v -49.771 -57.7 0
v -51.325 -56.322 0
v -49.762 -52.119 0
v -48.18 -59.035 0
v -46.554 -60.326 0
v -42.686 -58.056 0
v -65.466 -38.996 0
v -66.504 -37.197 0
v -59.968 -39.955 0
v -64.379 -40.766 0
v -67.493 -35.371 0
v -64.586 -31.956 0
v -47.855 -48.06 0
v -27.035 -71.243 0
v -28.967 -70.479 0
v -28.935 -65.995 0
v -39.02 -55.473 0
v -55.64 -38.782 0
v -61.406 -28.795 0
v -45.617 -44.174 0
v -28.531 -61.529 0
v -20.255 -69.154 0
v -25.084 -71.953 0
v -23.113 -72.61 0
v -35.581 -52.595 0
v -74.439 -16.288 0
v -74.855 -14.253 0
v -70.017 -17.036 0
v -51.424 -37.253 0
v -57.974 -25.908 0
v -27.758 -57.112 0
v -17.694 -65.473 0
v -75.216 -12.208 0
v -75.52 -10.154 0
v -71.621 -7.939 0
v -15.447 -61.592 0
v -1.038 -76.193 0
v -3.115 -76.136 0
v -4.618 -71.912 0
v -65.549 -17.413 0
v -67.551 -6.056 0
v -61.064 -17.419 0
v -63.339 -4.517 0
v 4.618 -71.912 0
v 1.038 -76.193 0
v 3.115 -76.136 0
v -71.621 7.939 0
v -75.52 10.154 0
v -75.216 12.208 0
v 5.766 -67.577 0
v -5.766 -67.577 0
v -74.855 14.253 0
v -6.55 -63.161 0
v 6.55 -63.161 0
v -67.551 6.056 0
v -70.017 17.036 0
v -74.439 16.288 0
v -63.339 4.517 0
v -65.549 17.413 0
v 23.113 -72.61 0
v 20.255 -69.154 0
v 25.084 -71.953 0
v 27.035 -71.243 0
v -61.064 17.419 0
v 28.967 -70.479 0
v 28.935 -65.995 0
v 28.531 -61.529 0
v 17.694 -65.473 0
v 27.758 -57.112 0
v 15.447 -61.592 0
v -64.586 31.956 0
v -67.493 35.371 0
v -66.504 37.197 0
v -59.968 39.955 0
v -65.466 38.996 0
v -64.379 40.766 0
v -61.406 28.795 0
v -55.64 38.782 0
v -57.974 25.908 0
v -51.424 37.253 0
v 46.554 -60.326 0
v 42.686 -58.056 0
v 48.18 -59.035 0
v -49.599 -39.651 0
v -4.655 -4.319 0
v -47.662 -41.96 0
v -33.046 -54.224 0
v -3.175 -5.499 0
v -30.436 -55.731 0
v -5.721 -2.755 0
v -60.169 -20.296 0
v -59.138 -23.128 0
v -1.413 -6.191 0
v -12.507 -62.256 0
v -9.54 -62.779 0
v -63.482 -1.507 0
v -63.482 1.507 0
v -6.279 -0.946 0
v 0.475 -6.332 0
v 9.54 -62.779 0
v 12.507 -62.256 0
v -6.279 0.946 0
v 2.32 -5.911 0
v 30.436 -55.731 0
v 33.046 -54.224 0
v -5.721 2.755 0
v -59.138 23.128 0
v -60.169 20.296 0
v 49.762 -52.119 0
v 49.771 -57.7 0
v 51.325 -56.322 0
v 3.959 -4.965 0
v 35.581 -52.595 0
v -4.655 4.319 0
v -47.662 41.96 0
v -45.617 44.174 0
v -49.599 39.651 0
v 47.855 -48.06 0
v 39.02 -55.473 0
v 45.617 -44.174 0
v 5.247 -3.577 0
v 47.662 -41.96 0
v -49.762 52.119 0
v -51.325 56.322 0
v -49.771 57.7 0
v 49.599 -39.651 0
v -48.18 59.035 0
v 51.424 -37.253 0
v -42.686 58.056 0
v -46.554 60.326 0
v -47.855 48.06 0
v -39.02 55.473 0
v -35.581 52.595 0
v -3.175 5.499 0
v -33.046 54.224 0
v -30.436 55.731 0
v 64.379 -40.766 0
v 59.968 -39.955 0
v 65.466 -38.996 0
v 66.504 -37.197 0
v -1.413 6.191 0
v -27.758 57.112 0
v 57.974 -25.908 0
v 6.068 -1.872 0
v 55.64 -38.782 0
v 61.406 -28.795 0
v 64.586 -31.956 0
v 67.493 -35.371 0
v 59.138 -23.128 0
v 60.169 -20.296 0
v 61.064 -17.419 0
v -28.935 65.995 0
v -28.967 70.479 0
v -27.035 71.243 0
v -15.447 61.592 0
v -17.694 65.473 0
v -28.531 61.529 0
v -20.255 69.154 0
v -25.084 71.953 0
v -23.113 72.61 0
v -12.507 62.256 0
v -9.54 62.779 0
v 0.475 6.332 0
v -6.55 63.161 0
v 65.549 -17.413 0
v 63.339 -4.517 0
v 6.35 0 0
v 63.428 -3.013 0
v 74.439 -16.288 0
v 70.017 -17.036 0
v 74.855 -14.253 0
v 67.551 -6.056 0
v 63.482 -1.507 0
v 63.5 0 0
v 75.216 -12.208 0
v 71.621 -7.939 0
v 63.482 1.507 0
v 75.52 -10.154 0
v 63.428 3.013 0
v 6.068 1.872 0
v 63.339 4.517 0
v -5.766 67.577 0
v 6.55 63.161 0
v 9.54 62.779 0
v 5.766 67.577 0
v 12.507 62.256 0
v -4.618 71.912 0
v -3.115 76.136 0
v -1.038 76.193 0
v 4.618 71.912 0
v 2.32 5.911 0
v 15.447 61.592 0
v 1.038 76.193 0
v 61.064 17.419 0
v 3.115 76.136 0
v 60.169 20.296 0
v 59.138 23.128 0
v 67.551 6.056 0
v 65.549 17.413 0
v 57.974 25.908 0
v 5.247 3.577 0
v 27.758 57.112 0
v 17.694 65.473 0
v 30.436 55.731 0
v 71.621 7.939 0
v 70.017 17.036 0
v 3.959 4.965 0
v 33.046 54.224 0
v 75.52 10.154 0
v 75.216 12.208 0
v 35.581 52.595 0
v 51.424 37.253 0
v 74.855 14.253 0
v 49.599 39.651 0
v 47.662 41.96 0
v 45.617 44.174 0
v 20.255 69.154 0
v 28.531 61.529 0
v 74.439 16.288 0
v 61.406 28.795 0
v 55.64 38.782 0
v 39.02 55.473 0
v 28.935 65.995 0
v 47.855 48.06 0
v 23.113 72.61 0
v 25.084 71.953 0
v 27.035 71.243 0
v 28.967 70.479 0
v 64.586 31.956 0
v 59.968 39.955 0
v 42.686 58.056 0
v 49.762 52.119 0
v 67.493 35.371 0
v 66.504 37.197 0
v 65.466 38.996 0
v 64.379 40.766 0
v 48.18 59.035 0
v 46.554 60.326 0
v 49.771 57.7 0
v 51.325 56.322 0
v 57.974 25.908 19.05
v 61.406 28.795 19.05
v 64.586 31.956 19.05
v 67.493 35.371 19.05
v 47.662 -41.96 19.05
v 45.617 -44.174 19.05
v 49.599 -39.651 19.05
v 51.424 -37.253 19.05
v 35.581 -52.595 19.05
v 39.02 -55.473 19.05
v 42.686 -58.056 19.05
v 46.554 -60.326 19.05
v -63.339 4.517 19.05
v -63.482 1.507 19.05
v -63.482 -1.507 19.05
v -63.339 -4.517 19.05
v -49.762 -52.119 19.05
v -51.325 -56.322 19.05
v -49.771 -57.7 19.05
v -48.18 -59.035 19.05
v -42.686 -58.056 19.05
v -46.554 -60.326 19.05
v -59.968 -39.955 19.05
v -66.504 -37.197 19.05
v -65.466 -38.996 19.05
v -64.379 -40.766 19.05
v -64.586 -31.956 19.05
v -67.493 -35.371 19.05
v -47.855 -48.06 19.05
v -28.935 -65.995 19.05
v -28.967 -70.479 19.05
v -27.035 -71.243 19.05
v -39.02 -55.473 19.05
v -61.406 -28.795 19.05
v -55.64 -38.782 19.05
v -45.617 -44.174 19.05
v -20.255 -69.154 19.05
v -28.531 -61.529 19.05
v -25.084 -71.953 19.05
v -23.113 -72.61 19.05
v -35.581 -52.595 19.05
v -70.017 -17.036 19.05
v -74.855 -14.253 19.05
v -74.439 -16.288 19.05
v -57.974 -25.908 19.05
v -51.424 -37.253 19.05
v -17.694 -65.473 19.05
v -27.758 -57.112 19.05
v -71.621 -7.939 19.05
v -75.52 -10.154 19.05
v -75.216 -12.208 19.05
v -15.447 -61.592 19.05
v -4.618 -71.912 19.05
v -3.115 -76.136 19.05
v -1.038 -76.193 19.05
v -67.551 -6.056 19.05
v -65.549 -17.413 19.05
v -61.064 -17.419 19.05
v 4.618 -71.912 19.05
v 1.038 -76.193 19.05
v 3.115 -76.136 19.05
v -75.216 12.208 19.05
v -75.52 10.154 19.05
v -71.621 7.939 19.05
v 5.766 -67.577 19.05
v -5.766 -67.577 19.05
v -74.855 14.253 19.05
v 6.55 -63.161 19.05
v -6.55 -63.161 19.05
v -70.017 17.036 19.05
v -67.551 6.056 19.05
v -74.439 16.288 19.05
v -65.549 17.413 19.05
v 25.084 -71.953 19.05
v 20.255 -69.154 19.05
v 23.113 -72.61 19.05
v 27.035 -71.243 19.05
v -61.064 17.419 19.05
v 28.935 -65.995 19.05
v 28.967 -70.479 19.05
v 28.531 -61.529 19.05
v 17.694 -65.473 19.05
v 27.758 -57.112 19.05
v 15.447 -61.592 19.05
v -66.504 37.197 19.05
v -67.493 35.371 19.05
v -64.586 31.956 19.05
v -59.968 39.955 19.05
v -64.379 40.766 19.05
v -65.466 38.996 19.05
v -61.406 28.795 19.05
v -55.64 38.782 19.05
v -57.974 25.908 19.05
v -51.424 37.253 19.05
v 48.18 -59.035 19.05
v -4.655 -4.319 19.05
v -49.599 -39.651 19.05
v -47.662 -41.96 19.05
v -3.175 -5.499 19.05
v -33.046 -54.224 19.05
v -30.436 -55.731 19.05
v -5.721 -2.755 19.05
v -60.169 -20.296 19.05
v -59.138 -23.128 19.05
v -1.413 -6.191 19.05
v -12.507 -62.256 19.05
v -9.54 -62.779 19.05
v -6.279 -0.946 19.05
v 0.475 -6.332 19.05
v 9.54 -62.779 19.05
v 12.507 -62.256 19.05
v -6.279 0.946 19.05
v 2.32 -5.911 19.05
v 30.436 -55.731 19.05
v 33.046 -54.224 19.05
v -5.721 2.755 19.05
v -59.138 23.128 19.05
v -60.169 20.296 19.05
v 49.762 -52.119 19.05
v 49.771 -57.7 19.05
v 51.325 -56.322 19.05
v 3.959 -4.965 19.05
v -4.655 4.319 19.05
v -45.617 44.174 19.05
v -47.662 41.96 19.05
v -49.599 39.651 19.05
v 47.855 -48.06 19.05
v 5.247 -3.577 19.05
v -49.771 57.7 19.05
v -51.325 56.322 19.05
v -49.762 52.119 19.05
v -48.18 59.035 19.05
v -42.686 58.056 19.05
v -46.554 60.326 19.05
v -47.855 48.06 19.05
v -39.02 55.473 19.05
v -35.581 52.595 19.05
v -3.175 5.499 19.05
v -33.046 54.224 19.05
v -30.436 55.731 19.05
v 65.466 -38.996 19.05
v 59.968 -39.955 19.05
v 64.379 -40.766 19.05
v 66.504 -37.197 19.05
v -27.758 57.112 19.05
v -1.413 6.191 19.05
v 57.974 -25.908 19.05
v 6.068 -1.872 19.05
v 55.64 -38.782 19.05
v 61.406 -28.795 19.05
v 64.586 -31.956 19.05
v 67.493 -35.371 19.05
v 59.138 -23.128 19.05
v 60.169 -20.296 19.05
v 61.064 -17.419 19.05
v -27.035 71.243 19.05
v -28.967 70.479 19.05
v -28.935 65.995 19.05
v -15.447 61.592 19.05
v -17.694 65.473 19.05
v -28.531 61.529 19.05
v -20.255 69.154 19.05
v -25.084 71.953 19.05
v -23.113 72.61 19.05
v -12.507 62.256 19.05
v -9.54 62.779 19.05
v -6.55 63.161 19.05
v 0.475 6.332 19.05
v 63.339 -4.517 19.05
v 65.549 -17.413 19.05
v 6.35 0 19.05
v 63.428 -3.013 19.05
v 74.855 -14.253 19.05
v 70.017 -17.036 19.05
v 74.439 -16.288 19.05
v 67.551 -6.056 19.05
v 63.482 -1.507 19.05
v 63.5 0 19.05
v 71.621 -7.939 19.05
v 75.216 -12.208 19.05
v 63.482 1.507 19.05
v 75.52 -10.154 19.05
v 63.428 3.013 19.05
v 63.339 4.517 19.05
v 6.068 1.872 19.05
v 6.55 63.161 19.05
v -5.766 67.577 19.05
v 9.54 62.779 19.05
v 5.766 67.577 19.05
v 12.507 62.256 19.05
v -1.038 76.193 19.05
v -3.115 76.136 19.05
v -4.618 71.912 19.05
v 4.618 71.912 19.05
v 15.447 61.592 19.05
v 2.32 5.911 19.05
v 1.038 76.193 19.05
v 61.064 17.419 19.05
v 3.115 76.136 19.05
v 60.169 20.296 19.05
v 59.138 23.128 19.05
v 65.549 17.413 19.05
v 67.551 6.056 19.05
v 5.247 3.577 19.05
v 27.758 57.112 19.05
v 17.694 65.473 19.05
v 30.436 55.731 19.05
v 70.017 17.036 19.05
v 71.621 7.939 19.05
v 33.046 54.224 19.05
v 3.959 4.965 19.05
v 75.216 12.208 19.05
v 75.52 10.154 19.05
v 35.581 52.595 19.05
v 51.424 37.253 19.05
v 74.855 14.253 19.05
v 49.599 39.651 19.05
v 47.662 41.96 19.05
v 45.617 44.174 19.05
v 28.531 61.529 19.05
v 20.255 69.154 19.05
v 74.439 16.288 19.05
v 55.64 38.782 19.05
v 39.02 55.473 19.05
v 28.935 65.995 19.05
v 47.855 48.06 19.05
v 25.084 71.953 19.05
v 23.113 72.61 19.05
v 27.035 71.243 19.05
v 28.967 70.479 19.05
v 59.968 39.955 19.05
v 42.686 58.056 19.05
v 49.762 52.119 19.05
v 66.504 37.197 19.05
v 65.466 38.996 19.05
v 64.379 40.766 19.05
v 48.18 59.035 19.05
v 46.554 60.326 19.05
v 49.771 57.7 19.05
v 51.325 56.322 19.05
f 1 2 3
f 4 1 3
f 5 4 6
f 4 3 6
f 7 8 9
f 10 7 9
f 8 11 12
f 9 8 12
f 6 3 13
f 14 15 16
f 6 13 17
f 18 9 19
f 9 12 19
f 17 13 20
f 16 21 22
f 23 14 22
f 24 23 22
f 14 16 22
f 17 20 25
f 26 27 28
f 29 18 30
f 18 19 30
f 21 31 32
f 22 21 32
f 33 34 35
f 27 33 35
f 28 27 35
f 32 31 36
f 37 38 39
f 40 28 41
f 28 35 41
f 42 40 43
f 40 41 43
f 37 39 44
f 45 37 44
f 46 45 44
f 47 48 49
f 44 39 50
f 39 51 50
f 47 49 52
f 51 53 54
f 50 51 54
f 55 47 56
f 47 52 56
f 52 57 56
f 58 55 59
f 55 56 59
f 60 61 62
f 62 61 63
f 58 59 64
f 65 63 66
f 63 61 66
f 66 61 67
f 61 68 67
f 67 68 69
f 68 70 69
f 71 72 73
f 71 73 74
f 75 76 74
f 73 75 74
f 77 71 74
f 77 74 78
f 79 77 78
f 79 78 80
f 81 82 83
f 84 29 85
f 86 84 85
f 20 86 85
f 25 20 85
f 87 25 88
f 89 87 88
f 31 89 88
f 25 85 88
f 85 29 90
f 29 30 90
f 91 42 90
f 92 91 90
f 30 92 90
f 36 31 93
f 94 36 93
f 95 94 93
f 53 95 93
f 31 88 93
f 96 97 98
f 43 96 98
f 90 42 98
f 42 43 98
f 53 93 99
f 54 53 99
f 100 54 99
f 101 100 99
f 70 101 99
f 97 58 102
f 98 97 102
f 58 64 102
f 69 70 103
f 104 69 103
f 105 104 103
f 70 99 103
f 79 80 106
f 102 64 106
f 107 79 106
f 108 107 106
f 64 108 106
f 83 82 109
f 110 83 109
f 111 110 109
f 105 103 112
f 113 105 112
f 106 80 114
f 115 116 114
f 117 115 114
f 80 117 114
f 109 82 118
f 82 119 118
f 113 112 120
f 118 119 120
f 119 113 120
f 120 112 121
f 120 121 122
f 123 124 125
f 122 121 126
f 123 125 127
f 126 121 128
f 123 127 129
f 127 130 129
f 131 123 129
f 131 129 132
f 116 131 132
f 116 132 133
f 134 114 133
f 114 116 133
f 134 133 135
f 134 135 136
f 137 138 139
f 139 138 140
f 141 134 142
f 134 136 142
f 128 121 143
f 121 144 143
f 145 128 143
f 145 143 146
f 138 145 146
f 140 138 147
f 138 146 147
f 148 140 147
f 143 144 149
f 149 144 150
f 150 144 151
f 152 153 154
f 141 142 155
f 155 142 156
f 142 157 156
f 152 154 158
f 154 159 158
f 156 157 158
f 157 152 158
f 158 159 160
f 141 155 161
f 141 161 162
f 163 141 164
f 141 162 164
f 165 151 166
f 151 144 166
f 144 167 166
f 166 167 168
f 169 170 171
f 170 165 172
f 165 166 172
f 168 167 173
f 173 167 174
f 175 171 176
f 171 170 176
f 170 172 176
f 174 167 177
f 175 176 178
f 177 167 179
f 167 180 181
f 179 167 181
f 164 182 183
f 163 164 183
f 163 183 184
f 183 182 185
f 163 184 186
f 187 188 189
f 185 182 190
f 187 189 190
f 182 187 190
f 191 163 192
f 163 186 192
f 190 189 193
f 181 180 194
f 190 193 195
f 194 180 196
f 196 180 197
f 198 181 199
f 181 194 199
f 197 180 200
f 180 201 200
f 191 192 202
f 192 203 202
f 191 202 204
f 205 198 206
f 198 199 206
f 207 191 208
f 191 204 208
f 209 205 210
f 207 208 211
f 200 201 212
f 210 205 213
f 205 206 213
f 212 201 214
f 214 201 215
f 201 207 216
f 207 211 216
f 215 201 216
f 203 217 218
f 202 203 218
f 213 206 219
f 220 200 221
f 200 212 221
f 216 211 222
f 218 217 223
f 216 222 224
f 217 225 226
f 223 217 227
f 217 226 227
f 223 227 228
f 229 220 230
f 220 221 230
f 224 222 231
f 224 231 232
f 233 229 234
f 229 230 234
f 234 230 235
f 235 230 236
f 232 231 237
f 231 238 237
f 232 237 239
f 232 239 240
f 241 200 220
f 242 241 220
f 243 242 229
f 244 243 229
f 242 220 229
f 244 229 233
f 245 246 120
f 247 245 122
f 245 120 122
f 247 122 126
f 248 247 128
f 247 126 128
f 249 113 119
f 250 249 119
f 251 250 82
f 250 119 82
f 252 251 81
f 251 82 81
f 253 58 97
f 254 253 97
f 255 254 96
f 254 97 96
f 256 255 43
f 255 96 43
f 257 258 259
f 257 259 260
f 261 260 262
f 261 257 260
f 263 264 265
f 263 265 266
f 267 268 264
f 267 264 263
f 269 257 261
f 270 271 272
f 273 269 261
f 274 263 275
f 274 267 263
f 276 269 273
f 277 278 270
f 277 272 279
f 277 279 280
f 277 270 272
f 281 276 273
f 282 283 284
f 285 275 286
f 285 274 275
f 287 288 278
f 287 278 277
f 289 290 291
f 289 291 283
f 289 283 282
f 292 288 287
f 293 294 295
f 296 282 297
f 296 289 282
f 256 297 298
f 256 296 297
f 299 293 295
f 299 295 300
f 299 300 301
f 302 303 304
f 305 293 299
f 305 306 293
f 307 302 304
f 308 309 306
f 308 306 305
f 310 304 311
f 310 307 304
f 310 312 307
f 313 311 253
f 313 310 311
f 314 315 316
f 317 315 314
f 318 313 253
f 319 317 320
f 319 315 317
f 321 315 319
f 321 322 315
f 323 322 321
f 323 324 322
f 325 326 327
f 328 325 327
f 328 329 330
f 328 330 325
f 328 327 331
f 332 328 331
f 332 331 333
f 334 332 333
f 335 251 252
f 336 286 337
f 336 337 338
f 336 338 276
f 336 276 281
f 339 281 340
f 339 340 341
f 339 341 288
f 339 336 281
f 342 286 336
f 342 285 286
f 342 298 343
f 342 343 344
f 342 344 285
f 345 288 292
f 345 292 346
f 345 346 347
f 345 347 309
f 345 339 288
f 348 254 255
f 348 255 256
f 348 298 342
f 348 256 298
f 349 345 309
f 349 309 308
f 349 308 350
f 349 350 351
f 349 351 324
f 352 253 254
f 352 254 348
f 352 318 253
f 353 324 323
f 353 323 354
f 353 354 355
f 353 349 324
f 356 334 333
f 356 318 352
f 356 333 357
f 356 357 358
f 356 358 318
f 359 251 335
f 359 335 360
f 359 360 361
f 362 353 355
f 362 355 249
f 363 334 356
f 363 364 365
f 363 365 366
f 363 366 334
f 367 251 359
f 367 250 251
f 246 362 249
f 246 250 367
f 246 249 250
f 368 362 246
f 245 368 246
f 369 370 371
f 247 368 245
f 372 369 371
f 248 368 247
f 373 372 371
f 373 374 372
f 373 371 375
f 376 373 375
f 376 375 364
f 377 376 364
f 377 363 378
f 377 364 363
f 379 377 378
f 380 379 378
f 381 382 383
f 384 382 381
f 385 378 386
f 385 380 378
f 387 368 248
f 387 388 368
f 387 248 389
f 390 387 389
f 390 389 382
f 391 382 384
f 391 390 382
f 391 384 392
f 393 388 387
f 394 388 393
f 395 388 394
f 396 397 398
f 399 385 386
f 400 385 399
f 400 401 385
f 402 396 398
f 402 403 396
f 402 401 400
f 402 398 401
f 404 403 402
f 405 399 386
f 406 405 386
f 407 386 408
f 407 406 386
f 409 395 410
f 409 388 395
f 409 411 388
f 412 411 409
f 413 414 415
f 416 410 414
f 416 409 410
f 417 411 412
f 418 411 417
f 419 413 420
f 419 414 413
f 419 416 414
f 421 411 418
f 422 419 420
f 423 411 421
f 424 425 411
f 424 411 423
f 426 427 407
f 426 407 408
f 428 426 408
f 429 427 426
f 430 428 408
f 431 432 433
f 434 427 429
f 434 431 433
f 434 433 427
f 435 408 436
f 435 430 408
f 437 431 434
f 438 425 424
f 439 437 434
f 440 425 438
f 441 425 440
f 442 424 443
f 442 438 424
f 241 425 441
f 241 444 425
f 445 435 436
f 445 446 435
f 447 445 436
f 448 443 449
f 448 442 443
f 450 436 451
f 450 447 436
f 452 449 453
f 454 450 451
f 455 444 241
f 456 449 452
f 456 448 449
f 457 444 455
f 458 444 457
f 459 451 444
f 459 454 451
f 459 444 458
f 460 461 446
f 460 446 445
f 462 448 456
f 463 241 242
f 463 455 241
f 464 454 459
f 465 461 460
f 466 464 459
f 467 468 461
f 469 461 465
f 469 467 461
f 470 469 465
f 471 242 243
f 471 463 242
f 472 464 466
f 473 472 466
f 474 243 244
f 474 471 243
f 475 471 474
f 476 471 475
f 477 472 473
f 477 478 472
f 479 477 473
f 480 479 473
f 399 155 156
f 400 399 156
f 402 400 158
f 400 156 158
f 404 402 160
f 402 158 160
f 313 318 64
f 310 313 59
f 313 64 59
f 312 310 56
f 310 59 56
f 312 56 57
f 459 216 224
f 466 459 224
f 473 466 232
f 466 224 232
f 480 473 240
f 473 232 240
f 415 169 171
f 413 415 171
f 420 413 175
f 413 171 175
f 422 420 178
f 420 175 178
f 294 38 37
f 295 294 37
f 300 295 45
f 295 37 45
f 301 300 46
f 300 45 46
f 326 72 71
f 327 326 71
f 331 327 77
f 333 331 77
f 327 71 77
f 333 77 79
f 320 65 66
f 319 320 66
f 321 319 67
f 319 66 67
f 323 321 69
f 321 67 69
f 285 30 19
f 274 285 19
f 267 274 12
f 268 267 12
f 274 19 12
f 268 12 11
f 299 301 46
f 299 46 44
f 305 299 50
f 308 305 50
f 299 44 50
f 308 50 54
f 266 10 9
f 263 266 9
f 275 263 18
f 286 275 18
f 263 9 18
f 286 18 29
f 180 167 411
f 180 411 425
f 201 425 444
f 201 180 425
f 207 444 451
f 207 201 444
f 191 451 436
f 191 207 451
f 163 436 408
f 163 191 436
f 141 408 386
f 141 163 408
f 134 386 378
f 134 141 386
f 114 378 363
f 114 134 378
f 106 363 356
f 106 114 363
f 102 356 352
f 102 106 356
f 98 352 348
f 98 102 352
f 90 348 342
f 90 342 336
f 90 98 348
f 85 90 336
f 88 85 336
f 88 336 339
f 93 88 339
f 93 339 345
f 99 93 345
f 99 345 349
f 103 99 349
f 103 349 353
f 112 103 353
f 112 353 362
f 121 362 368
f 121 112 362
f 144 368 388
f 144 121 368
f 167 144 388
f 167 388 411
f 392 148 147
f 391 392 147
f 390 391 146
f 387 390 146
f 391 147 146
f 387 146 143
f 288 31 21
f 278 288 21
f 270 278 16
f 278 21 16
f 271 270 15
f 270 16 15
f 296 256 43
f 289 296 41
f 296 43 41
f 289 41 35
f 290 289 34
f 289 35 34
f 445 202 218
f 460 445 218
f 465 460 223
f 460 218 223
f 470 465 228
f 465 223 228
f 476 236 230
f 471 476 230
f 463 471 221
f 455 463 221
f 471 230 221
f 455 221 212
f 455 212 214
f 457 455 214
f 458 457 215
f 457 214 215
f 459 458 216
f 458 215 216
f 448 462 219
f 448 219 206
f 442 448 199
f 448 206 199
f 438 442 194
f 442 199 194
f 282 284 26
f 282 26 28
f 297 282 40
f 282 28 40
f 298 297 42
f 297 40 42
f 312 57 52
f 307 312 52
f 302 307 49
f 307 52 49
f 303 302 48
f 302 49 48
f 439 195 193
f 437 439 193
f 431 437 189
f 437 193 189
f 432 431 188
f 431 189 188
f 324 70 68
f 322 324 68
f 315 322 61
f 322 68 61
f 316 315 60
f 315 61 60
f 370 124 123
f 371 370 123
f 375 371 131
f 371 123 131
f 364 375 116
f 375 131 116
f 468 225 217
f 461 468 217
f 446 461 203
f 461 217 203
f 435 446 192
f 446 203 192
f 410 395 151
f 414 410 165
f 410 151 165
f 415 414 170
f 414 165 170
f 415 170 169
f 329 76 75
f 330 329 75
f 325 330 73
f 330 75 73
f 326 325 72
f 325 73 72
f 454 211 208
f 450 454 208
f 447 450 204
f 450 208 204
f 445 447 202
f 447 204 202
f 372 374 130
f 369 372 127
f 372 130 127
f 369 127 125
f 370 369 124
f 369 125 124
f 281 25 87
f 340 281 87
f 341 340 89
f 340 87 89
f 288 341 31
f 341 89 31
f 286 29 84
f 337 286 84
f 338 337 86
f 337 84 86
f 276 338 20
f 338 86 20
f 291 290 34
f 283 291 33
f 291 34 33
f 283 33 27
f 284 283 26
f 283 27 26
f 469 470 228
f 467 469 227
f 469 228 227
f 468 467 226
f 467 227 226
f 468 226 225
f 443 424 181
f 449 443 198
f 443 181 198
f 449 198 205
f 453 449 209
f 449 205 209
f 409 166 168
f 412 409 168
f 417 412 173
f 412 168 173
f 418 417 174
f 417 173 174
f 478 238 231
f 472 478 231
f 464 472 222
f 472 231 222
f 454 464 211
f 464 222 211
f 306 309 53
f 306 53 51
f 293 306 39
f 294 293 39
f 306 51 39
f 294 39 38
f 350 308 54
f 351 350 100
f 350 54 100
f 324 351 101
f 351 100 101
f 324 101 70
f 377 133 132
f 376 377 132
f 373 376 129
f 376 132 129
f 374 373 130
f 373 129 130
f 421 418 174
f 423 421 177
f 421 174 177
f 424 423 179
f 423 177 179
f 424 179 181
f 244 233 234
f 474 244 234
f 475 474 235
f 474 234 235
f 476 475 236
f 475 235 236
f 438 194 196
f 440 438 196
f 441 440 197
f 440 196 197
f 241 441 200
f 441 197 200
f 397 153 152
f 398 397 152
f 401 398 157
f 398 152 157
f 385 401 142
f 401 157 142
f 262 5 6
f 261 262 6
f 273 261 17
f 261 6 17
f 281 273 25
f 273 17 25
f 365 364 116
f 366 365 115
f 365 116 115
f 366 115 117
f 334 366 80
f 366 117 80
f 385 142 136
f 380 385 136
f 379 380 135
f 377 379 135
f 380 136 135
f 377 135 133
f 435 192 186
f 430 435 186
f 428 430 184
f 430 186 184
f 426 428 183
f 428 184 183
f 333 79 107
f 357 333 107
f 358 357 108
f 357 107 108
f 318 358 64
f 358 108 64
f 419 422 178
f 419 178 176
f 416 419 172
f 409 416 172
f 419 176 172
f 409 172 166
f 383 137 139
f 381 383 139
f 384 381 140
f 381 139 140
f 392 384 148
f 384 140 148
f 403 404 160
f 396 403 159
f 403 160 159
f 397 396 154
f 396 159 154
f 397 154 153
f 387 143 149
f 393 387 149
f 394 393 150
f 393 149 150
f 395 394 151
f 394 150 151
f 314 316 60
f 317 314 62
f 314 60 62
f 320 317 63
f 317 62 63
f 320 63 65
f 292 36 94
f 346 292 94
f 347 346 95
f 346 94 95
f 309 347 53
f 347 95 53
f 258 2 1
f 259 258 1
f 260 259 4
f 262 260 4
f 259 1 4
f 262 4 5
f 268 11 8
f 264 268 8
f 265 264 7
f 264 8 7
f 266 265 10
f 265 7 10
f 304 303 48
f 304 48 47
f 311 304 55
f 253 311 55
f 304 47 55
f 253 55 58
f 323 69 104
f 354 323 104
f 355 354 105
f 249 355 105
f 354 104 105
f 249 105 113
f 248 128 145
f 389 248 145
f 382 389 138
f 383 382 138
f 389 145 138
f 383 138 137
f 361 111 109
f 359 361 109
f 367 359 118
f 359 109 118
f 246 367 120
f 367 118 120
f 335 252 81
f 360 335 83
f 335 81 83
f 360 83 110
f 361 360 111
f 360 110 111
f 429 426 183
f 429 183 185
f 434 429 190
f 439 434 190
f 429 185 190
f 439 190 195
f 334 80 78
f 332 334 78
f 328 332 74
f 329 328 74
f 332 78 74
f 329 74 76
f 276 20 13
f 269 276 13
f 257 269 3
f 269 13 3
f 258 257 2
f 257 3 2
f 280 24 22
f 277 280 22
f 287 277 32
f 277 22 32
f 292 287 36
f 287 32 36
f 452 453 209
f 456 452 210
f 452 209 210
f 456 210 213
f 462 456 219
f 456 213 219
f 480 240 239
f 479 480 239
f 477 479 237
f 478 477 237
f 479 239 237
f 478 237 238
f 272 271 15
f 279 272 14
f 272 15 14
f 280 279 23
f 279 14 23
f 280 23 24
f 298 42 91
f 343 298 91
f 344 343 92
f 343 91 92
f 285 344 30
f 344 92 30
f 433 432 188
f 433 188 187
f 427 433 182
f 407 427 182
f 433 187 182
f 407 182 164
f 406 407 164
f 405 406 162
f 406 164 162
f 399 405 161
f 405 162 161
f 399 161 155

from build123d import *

# Parameters (mm, degrees)
F0_R     = 6.35
F1_DEPTH = 19.05


with BuildPart() as f1:
    # F0 (on Top) → F1 (new body)
    with BuildSketch(Plane.XY):
        with BuildLine():
            ThreePointArc((61.064257, 17.418569), (62.535292, 11.026659), (63.339133, 4.517105))
            ThreePointArc((63.339133, 4.517105), (69.605701, 6.955225), (75.520491, 10.153593))
            ThreePointArc((75.520491, 10.153593), (75.042351, 13.231991), (74.438781, 16.288273))
            ThreePointArc((74.438781, 16.288273), (67.78679, 17.270778), (61.064257, 17.418569))
        make_face()
        with BuildLine():
            ThreePointArc((51.42413, 37.253307), (54.992613, 31.75), (57.974375, 25.90795))
            ThreePointArc((57.974375, 25.90795), (63.029136, 30.342325), (67.493315, 35.370785))
            ThreePointArc((67.493315, 35.370785), (65.991136, 38.1), (64.378656, 40.765533))
            ThreePointArc((64.378656, 40.765533), (57.791793, 39.413671), (51.42413, 37.253307))
        make_face()
        with BuildLine():
            ThreePointArc((35.581494, 52.594746), (40.817013, 48.643822), (45.617052, 44.173913))
            ThreePointArc((45.617052, 44.173913), (48.850328, 50.069693), (51.325449, 56.321739))
            ThreePointArc((51.325449, 56.321739), (48.980416, 58.372587), (46.553515, 60.325867))
            ThreePointArc((46.553515, 60.325867), (40.826252, 56.802693), (35.581494, 52.594746))
        make_face()
        with BuildLine():
            ThreePointArc((15.447205, 61.592482), (21.718279, 59.670481), (27.757639, 57.111851))
            ThreePointArc((27.757639, 57.111851), (28.779449, 63.757918), (28.966976, 70.47946))
            ThreePointArc((28.966976, 70.47946), (26.061935, 71.604578), (23.113332, 72.610012))
            ThreePointArc((23.113332, 72.610012), (18.936463, 67.340472), (15.447205, 61.592482))
        make_face()
        with BuildLine():
            ThreePointArc((-6.550245, 63.161256), (0, 63.5), (6.550245, 63.161256))
            ThreePointArc((6.550245, 63.161256), (5.237344, 69.755996), (3.114659, 76.136318))
            ThreePointArc((3.114659, 76.136318), (0, 76.2), (-3.114659, 76.136318))
            ThreePointArc((-3.114659, 76.136318), (-5.237344, 69.755996), (-6.550245, 63.161256))
        make_face()
        with BuildLine():
            ThreePointArc((-27.757639, 57.111851), (-21.718279, 59.670481), (-15.447205, 61.592482))
            ThreePointArc((-15.447205, 61.592482), (-18.936463, 67.340472), (-23.113332, 72.610012))
            ThreePointArc((-23.113332, 72.610012), (-26.061935, 71.604578), (-28.966976, 70.47946))
            ThreePointArc((-28.966976, 70.47946), (-28.779449, 63.757918), (-27.757639, 57.111851))
        make_face()
        with BuildLine():
            ThreePointArc((-45.617052, 44.173913), (-40.817013, 48.643822), (-35.581494, 52.594746))
            ThreePointArc((-35.581494, 52.594746), (-40.826252, 56.802693), (-46.553515, 60.325867))
            ThreePointArc((-46.553515, 60.325867), (-48.980416, 58.372587), (-51.325449, 56.321739))
            ThreePointArc((-51.325449, 56.321739), (-48.850328, 50.069693), (-45.617052, 44.173913))
        make_face()
        with BuildLine():
            ThreePointArc((-57.974375, 25.90795), (-54.992613, 31.75), (-51.42413, 37.253307))
            ThreePointArc((-51.42413, 37.253307), (-57.791793, 39.413671), (-64.378656, 40.765533))
            ThreePointArc((-64.378656, 40.765533), (-65.991136, 38.1), (-67.493315, 35.370785))
            ThreePointArc((-67.493315, 35.370785), (-63.029136, 30.342325), (-57.974375, 25.90795))
        make_face()
        with BuildLine():
            ThreePointArc((-63.339133, 4.517105), (-62.535292, 11.026659), (-61.064257, 17.418569))
            ThreePointArc((-61.064257, 17.418569), (-67.78679, 17.270778), (-74.438781, 16.288273))
            ThreePointArc((-74.438781, 16.288273), (-75.042351, 13.231991), (-75.520491, 10.153593))
            ThreePointArc((-75.520491, 10.153593), (-69.605701, 6.955225), (-63.339133, 4.517105))
        make_face()
        with BuildLine():
            ThreePointArc((-74.438781, -16.288273), (-67.78679, -17.270778), (-61.064257, -17.418569))
            ThreePointArc((-61.064257, -17.418569), (-62.535292, -11.026659), (-63.339133, -4.517105))
            ThreePointArc((-63.339133, -4.517105), (-69.605701, -6.955225), (-75.520491, -10.153593))
            ThreePointArc((-75.520491, -10.153593), (-75.042351, -13.231991), (-74.438781, -16.288273))
        make_face()
        with BuildLine():
            ThreePointArc((-64.378656, -40.765533), (-57.791793, -39.413671), (-51.42413, -37.253307))
            ThreePointArc((-51.42413, -37.253307), (-54.992613, -31.75), (-57.974375, -25.90795))
            ThreePointArc((-57.974375, -25.90795), (-63.029136, -30.342325), (-67.493315, -35.370785))
            ThreePointArc((-67.493315, -35.370785), (-65.991136, -38.1), (-64.378656, -40.765533))
        make_face()
        with BuildLine():
            ThreePointArc((-46.553515, -60.325867), (-40.826252, -56.802693), (-35.581494, -52.594746))
            ThreePointArc((-35.581494, -52.594746), (-40.817013, -48.643822), (-45.617052, -44.173913))
            ThreePointArc((-45.617052, -44.173913), (-48.850328, -50.069693), (-51.325449, -56.321739))
            ThreePointArc((-51.325449, -56.321739), (-48.980416, -58.372587), (-46.553515, -60.325867))
        make_face()
        with BuildLine():
            ThreePointArc((-23.113332, -72.610012), (-18.936463, -67.340472), (-15.447205, -61.592482))
            ThreePointArc((-15.447205, -61.592482), (-21.718279, -59.670481), (-27.757639, -57.111851))
            ThreePointArc((-27.757639, -57.111851), (-28.779449, -63.757918), (-28.966976, -70.47946))
            ThreePointArc((-28.966976, -70.47946), (-26.061935, -71.604578), (-23.113332, -72.610012))
        make_face()
        with BuildLine():
            ThreePointArc((3.114659, -76.136318), (5.237344, -69.755996), (6.550245, -63.161256))
            ThreePointArc((6.550245, -63.161256), (0, -63.5), (-6.550245, -63.161256))
            ThreePointArc((-6.550245, -63.161256), (-5.237344, -69.755996), (-3.114659, -76.136318))
            ThreePointArc((-3.114659, -76.136318), (0, -76.2), (3.114659, -76.136318))
        make_face()
        with BuildLine():
            ThreePointArc((28.966976, -70.47946), (28.779449, -63.757918), (27.757639, -57.111851))
            ThreePointArc((27.757639, -57.111851), (21.718279, -59.670481), (15.447205, -61.592482))
            ThreePointArc((15.447205, -61.592482), (18.936463, -67.340472), (23.113332, -72.610012))
            ThreePointArc((23.113332, -72.610012), (26.061935, -71.604578), (28.966976, -70.47946))
        make_face()
        with BuildLine():
            ThreePointArc((51.325449, -56.321739), (48.850328, -50.069693), (45.617052, -44.173913))
            ThreePointArc((45.617052, -44.173913), (40.817013, -48.643822), (35.581494, -52.594746))
            ThreePointArc((35.581494, -52.594746), (40.826252, -56.802693), (46.553515, -60.325867))
            ThreePointArc((46.553515, -60.325867), (48.980416, -58.372587), (51.325449, -56.321739))
        make_face()
        with BuildLine():
            ThreePointArc((67.493315, -35.370785), (63.029136, -30.342325), (57.974375, -25.90795))
            ThreePointArc((57.974375, -25.90795), (54.992613, -31.75), (51.42413, -37.253307))
            ThreePointArc((51.42413, -37.253307), (57.791793, -39.413671), (64.378656, -40.765533))
            ThreePointArc((64.378656, -40.765533), (65.991136, -38.1), (67.493315, -35.370785))
        make_face()
        with BuildLine():
            ThreePointArc((75.520491, -10.153593), (69.605701, -6.955225), (63.339133, -4.517105))
            ThreePointArc((63.339133, -4.517105), (62.535292, -11.026659), (61.064257, -17.418569))
            ThreePointArc((61.064257, -17.418569), (67.78679, -17.270778), (74.438781, -16.288273))
            ThreePointArc((74.438781, -16.288273), (75.042351, -13.231991), (75.520491, -10.153593))
        make_face()
        with BuildLine():
            ThreePointArc((63.339133, -4.517105), (63.45977, -2.259984), (63.5, 0))
            ThreePointArc((63.5, 0), (63.45977, 2.259984), (63.339133, 4.517105))
            ThreePointArc((63.339133, 4.517105), (62.535292, 11.026659), (61.064257, 17.418569))
            ThreePointArc((61.064257, 17.418569), (59.670481, 21.718279), (57.974375, 25.90795))
            ThreePointArc((57.974375, 25.90795), (54.992613, 31.75), (51.42413, 37.253307))
            ThreePointArc((51.42413, 37.253307), (48.643822, 40.817013), (45.617052, 44.173913))
            ThreePointArc((45.617052, 44.173913), (40.817013, 48.643822), (35.581494, 52.594746))
            ThreePointArc((35.581494, 52.594746), (31.75, 54.992613), (27.757639, 57.111851))
            ThreePointArc((27.757639, 57.111851), (21.718279, 59.670481), (15.447205, 61.592482))
            ThreePointArc((15.447205, 61.592482), (11.026659, 62.535292), (6.550245, 63.161256))
            ThreePointArc((6.550245, 63.161256), (0, 63.5), (-6.550245, 63.161256))
            ThreePointArc((-6.550245, 63.161256), (-11.026659, 62.535292), (-15.447205, 61.592482))
            ThreePointArc((-15.447205, 61.592482), (-21.718279, 59.670481), (-27.757639, 57.111851))
            ThreePointArc((-27.757639, 57.111851), (-31.75, 54.992613), (-35.581494, 52.594746))
            ThreePointArc((-35.581494, 52.594746), (-40.817013, 48.643822), (-45.617052, 44.173913))
            ThreePointArc((-45.617052, 44.173913), (-48.643822, 40.817013), (-51.42413, 37.253307))
            ThreePointArc((-51.42413, 37.253307), (-54.992613, 31.75), (-57.974375, 25.90795))
            ThreePointArc((-57.974375, 25.90795), (-59.670481, 21.718279), (-61.064257, 17.418569))
            ThreePointArc((-61.064257, 17.418569), (-62.535292, 11.026659), (-63.339133, 4.517105))
            ThreePointArc((-63.339133, 4.517105), (-63.5, 0), (-63.339133, -4.517105))
            ThreePointArc((-63.339133, -4.517105), (-62.535292, -11.026659), (-61.064257, -17.418569))
            ThreePointArc((-61.064257, -17.418569), (-59.670481, -21.718279), (-57.974375, -25.90795))
            ThreePointArc((-57.974375, -25.90795), (-54.992613, -31.75), (-51.42413, -37.253307))
            ThreePointArc((-51.42413, -37.253307), (-48.643822, -40.817013), (-45.617052, -44.173913))
            ThreePointArc((-45.617052, -44.173913), (-40.817013, -48.643822), (-35.581494, -52.594746))
            ThreePointArc((-35.581494, -52.594746), (-31.75, -54.992613), (-27.757639, -57.111851))
            ThreePointArc((-27.757639, -57.111851), (-21.718279, -59.670481), (-15.447205, -61.592482))
            ThreePointArc((-15.447205, -61.592482), (-11.026659, -62.535292), (-6.550245, -63.161256))
            ThreePointArc((-6.550245, -63.161256), (0, -63.5), (6.550245, -63.161256))
            ThreePointArc((6.550245, -63.161256), (11.026659, -62.535292), (15.447205, -61.592482))
            ThreePointArc((15.447205, -61.592482), (21.718279, -59.670481), (27.757639, -57.111851))
            ThreePointArc((27.757639, -57.111851), (31.75, -54.992613), (35.581494, -52.594746))
            ThreePointArc((35.581494, -52.594746), (40.817013, -48.643822), (45.617052, -44.173913))
            ThreePointArc((45.617052, -44.173913), (48.643822, -40.817013), (51.42413, -37.253307))
            ThreePointArc((51.42413, -37.253307), (54.992613, -31.75), (57.974375, -25.90795))
            ThreePointArc((57.974375, -25.90795), (59.670481, -21.718279), (61.064257, -17.418569))
            ThreePointArc((61.064257, -17.418569), (62.535292, -11.026659), (63.339133, -4.517105))
        make_face()
        Circle(F0_R, mode=Mode.SUBTRACT)
    extrude(amount=F1_DEPTH)


solid = f1.part
